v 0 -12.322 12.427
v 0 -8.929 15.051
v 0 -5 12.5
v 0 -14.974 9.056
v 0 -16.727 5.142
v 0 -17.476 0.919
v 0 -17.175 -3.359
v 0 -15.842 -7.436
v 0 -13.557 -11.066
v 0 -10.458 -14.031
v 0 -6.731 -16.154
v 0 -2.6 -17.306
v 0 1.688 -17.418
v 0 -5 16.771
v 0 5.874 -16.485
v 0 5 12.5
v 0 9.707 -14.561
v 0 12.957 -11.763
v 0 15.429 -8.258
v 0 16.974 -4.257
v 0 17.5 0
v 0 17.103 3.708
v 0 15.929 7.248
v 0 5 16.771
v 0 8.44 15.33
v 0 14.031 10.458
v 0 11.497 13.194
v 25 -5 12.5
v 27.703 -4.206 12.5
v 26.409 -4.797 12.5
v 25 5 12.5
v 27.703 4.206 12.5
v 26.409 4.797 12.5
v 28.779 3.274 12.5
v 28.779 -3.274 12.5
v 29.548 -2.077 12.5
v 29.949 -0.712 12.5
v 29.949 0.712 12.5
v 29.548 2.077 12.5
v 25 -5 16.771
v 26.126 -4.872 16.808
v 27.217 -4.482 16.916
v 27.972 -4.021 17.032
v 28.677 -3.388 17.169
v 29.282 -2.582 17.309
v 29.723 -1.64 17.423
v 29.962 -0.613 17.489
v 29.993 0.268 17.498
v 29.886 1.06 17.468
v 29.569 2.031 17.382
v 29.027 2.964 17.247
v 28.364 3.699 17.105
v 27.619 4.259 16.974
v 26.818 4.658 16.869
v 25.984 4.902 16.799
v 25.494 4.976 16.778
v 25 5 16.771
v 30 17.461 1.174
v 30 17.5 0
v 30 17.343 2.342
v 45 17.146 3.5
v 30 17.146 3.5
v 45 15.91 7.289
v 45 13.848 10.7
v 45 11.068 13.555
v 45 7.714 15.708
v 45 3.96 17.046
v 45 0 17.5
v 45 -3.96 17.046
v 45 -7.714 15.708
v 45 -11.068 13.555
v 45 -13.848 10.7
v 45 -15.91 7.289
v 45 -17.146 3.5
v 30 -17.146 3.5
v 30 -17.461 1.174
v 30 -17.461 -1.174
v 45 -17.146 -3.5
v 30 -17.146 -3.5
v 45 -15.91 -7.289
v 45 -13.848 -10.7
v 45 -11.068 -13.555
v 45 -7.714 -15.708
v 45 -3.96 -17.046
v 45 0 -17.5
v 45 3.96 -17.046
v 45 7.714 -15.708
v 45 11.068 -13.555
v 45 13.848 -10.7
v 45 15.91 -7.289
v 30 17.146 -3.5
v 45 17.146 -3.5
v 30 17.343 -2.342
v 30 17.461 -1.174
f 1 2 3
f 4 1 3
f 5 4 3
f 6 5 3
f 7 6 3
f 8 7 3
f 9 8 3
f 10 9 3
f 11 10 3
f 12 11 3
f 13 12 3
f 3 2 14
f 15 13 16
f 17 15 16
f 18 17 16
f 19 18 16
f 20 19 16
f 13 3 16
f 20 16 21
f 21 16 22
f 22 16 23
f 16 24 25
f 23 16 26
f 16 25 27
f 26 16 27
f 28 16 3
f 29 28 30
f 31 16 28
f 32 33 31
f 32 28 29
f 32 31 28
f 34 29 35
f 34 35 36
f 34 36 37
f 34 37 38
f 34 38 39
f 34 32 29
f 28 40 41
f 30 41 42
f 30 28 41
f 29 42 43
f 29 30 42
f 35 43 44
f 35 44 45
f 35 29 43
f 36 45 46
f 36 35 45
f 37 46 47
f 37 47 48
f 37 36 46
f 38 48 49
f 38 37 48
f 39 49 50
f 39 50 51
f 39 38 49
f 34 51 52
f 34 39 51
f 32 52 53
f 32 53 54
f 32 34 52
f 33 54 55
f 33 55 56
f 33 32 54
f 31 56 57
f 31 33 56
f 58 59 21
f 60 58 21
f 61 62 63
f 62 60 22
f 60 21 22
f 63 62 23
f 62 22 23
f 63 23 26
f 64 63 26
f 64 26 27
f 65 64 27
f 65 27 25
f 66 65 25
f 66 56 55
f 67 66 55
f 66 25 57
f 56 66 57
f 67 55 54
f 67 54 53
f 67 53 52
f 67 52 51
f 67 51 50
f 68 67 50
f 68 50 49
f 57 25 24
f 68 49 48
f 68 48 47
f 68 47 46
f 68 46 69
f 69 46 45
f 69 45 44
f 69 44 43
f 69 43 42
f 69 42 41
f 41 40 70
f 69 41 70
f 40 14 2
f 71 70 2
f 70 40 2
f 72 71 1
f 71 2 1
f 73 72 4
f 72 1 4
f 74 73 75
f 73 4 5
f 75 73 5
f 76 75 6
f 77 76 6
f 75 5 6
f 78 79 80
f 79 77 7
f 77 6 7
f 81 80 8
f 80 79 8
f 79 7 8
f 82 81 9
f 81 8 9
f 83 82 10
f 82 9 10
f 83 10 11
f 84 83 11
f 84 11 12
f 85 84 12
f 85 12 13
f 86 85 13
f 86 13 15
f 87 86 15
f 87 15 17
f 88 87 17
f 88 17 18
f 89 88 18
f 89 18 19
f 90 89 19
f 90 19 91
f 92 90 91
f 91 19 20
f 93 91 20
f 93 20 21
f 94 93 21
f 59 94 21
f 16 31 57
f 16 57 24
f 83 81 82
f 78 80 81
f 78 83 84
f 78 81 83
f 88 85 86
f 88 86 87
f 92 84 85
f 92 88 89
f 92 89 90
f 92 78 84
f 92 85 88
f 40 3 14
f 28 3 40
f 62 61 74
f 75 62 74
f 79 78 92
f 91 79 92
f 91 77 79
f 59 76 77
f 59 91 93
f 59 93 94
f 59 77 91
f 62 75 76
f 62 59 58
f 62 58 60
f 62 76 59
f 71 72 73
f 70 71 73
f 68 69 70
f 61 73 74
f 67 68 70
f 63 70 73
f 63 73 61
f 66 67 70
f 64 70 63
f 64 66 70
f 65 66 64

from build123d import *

# Parameters (mm, degrees)
F0_R     = 17.5
F1_DEPTH = 45
F3_DEPTH = 15
F6_DEPTH = 10


with BuildPart() as f1:
    # F0 (on Right) → F1 (new body)
    with BuildSketch(Plane.YZ):
        Circle(F0_R)
    extrude(amount=F1_DEPTH)

    # F2 (on face) → F3 (cut)
    with BuildSketch(Plane.YZ.offset(45)):
        with BuildLine():
            Line((17.1464281995, 3.5), (-17.1464281995, 3.5))
            ThreePointArc((-17.1464281995, 3.5), (-17.5, 0), (-17.1464281995, -3.5))
            Line((-17.1464281995, -3.5), (17.1464281995, -3.5))
            ThreePointArc((17.1464281995, -3.5), (17.4113826776, -1.7589068351), (17.5, 0))
            ThreePointArc((17.5, 0), (17.4113826776, 1.7589068351), (17.1464281995, 3.5))
        make_face()
    extrude(amount=-F3_DEPTH, mode=Mode.SUBTRACT)

    # F5 (on offset) → F6 (cut)
    with BuildSketch(Plane.XY.offset(12.5)):
        with BuildLine():
            Line((25, 5), (0, 5))
            Line((0, 5), (0, -5))
            Line((0, -5), (25, -5))
            ThreePointArc((25, -5), (30, 0), (25, 5))
        make_face()
    extrude(amount=F6_DEPTH, mode=Mode.SUBTRACT)


solid = f1.part
